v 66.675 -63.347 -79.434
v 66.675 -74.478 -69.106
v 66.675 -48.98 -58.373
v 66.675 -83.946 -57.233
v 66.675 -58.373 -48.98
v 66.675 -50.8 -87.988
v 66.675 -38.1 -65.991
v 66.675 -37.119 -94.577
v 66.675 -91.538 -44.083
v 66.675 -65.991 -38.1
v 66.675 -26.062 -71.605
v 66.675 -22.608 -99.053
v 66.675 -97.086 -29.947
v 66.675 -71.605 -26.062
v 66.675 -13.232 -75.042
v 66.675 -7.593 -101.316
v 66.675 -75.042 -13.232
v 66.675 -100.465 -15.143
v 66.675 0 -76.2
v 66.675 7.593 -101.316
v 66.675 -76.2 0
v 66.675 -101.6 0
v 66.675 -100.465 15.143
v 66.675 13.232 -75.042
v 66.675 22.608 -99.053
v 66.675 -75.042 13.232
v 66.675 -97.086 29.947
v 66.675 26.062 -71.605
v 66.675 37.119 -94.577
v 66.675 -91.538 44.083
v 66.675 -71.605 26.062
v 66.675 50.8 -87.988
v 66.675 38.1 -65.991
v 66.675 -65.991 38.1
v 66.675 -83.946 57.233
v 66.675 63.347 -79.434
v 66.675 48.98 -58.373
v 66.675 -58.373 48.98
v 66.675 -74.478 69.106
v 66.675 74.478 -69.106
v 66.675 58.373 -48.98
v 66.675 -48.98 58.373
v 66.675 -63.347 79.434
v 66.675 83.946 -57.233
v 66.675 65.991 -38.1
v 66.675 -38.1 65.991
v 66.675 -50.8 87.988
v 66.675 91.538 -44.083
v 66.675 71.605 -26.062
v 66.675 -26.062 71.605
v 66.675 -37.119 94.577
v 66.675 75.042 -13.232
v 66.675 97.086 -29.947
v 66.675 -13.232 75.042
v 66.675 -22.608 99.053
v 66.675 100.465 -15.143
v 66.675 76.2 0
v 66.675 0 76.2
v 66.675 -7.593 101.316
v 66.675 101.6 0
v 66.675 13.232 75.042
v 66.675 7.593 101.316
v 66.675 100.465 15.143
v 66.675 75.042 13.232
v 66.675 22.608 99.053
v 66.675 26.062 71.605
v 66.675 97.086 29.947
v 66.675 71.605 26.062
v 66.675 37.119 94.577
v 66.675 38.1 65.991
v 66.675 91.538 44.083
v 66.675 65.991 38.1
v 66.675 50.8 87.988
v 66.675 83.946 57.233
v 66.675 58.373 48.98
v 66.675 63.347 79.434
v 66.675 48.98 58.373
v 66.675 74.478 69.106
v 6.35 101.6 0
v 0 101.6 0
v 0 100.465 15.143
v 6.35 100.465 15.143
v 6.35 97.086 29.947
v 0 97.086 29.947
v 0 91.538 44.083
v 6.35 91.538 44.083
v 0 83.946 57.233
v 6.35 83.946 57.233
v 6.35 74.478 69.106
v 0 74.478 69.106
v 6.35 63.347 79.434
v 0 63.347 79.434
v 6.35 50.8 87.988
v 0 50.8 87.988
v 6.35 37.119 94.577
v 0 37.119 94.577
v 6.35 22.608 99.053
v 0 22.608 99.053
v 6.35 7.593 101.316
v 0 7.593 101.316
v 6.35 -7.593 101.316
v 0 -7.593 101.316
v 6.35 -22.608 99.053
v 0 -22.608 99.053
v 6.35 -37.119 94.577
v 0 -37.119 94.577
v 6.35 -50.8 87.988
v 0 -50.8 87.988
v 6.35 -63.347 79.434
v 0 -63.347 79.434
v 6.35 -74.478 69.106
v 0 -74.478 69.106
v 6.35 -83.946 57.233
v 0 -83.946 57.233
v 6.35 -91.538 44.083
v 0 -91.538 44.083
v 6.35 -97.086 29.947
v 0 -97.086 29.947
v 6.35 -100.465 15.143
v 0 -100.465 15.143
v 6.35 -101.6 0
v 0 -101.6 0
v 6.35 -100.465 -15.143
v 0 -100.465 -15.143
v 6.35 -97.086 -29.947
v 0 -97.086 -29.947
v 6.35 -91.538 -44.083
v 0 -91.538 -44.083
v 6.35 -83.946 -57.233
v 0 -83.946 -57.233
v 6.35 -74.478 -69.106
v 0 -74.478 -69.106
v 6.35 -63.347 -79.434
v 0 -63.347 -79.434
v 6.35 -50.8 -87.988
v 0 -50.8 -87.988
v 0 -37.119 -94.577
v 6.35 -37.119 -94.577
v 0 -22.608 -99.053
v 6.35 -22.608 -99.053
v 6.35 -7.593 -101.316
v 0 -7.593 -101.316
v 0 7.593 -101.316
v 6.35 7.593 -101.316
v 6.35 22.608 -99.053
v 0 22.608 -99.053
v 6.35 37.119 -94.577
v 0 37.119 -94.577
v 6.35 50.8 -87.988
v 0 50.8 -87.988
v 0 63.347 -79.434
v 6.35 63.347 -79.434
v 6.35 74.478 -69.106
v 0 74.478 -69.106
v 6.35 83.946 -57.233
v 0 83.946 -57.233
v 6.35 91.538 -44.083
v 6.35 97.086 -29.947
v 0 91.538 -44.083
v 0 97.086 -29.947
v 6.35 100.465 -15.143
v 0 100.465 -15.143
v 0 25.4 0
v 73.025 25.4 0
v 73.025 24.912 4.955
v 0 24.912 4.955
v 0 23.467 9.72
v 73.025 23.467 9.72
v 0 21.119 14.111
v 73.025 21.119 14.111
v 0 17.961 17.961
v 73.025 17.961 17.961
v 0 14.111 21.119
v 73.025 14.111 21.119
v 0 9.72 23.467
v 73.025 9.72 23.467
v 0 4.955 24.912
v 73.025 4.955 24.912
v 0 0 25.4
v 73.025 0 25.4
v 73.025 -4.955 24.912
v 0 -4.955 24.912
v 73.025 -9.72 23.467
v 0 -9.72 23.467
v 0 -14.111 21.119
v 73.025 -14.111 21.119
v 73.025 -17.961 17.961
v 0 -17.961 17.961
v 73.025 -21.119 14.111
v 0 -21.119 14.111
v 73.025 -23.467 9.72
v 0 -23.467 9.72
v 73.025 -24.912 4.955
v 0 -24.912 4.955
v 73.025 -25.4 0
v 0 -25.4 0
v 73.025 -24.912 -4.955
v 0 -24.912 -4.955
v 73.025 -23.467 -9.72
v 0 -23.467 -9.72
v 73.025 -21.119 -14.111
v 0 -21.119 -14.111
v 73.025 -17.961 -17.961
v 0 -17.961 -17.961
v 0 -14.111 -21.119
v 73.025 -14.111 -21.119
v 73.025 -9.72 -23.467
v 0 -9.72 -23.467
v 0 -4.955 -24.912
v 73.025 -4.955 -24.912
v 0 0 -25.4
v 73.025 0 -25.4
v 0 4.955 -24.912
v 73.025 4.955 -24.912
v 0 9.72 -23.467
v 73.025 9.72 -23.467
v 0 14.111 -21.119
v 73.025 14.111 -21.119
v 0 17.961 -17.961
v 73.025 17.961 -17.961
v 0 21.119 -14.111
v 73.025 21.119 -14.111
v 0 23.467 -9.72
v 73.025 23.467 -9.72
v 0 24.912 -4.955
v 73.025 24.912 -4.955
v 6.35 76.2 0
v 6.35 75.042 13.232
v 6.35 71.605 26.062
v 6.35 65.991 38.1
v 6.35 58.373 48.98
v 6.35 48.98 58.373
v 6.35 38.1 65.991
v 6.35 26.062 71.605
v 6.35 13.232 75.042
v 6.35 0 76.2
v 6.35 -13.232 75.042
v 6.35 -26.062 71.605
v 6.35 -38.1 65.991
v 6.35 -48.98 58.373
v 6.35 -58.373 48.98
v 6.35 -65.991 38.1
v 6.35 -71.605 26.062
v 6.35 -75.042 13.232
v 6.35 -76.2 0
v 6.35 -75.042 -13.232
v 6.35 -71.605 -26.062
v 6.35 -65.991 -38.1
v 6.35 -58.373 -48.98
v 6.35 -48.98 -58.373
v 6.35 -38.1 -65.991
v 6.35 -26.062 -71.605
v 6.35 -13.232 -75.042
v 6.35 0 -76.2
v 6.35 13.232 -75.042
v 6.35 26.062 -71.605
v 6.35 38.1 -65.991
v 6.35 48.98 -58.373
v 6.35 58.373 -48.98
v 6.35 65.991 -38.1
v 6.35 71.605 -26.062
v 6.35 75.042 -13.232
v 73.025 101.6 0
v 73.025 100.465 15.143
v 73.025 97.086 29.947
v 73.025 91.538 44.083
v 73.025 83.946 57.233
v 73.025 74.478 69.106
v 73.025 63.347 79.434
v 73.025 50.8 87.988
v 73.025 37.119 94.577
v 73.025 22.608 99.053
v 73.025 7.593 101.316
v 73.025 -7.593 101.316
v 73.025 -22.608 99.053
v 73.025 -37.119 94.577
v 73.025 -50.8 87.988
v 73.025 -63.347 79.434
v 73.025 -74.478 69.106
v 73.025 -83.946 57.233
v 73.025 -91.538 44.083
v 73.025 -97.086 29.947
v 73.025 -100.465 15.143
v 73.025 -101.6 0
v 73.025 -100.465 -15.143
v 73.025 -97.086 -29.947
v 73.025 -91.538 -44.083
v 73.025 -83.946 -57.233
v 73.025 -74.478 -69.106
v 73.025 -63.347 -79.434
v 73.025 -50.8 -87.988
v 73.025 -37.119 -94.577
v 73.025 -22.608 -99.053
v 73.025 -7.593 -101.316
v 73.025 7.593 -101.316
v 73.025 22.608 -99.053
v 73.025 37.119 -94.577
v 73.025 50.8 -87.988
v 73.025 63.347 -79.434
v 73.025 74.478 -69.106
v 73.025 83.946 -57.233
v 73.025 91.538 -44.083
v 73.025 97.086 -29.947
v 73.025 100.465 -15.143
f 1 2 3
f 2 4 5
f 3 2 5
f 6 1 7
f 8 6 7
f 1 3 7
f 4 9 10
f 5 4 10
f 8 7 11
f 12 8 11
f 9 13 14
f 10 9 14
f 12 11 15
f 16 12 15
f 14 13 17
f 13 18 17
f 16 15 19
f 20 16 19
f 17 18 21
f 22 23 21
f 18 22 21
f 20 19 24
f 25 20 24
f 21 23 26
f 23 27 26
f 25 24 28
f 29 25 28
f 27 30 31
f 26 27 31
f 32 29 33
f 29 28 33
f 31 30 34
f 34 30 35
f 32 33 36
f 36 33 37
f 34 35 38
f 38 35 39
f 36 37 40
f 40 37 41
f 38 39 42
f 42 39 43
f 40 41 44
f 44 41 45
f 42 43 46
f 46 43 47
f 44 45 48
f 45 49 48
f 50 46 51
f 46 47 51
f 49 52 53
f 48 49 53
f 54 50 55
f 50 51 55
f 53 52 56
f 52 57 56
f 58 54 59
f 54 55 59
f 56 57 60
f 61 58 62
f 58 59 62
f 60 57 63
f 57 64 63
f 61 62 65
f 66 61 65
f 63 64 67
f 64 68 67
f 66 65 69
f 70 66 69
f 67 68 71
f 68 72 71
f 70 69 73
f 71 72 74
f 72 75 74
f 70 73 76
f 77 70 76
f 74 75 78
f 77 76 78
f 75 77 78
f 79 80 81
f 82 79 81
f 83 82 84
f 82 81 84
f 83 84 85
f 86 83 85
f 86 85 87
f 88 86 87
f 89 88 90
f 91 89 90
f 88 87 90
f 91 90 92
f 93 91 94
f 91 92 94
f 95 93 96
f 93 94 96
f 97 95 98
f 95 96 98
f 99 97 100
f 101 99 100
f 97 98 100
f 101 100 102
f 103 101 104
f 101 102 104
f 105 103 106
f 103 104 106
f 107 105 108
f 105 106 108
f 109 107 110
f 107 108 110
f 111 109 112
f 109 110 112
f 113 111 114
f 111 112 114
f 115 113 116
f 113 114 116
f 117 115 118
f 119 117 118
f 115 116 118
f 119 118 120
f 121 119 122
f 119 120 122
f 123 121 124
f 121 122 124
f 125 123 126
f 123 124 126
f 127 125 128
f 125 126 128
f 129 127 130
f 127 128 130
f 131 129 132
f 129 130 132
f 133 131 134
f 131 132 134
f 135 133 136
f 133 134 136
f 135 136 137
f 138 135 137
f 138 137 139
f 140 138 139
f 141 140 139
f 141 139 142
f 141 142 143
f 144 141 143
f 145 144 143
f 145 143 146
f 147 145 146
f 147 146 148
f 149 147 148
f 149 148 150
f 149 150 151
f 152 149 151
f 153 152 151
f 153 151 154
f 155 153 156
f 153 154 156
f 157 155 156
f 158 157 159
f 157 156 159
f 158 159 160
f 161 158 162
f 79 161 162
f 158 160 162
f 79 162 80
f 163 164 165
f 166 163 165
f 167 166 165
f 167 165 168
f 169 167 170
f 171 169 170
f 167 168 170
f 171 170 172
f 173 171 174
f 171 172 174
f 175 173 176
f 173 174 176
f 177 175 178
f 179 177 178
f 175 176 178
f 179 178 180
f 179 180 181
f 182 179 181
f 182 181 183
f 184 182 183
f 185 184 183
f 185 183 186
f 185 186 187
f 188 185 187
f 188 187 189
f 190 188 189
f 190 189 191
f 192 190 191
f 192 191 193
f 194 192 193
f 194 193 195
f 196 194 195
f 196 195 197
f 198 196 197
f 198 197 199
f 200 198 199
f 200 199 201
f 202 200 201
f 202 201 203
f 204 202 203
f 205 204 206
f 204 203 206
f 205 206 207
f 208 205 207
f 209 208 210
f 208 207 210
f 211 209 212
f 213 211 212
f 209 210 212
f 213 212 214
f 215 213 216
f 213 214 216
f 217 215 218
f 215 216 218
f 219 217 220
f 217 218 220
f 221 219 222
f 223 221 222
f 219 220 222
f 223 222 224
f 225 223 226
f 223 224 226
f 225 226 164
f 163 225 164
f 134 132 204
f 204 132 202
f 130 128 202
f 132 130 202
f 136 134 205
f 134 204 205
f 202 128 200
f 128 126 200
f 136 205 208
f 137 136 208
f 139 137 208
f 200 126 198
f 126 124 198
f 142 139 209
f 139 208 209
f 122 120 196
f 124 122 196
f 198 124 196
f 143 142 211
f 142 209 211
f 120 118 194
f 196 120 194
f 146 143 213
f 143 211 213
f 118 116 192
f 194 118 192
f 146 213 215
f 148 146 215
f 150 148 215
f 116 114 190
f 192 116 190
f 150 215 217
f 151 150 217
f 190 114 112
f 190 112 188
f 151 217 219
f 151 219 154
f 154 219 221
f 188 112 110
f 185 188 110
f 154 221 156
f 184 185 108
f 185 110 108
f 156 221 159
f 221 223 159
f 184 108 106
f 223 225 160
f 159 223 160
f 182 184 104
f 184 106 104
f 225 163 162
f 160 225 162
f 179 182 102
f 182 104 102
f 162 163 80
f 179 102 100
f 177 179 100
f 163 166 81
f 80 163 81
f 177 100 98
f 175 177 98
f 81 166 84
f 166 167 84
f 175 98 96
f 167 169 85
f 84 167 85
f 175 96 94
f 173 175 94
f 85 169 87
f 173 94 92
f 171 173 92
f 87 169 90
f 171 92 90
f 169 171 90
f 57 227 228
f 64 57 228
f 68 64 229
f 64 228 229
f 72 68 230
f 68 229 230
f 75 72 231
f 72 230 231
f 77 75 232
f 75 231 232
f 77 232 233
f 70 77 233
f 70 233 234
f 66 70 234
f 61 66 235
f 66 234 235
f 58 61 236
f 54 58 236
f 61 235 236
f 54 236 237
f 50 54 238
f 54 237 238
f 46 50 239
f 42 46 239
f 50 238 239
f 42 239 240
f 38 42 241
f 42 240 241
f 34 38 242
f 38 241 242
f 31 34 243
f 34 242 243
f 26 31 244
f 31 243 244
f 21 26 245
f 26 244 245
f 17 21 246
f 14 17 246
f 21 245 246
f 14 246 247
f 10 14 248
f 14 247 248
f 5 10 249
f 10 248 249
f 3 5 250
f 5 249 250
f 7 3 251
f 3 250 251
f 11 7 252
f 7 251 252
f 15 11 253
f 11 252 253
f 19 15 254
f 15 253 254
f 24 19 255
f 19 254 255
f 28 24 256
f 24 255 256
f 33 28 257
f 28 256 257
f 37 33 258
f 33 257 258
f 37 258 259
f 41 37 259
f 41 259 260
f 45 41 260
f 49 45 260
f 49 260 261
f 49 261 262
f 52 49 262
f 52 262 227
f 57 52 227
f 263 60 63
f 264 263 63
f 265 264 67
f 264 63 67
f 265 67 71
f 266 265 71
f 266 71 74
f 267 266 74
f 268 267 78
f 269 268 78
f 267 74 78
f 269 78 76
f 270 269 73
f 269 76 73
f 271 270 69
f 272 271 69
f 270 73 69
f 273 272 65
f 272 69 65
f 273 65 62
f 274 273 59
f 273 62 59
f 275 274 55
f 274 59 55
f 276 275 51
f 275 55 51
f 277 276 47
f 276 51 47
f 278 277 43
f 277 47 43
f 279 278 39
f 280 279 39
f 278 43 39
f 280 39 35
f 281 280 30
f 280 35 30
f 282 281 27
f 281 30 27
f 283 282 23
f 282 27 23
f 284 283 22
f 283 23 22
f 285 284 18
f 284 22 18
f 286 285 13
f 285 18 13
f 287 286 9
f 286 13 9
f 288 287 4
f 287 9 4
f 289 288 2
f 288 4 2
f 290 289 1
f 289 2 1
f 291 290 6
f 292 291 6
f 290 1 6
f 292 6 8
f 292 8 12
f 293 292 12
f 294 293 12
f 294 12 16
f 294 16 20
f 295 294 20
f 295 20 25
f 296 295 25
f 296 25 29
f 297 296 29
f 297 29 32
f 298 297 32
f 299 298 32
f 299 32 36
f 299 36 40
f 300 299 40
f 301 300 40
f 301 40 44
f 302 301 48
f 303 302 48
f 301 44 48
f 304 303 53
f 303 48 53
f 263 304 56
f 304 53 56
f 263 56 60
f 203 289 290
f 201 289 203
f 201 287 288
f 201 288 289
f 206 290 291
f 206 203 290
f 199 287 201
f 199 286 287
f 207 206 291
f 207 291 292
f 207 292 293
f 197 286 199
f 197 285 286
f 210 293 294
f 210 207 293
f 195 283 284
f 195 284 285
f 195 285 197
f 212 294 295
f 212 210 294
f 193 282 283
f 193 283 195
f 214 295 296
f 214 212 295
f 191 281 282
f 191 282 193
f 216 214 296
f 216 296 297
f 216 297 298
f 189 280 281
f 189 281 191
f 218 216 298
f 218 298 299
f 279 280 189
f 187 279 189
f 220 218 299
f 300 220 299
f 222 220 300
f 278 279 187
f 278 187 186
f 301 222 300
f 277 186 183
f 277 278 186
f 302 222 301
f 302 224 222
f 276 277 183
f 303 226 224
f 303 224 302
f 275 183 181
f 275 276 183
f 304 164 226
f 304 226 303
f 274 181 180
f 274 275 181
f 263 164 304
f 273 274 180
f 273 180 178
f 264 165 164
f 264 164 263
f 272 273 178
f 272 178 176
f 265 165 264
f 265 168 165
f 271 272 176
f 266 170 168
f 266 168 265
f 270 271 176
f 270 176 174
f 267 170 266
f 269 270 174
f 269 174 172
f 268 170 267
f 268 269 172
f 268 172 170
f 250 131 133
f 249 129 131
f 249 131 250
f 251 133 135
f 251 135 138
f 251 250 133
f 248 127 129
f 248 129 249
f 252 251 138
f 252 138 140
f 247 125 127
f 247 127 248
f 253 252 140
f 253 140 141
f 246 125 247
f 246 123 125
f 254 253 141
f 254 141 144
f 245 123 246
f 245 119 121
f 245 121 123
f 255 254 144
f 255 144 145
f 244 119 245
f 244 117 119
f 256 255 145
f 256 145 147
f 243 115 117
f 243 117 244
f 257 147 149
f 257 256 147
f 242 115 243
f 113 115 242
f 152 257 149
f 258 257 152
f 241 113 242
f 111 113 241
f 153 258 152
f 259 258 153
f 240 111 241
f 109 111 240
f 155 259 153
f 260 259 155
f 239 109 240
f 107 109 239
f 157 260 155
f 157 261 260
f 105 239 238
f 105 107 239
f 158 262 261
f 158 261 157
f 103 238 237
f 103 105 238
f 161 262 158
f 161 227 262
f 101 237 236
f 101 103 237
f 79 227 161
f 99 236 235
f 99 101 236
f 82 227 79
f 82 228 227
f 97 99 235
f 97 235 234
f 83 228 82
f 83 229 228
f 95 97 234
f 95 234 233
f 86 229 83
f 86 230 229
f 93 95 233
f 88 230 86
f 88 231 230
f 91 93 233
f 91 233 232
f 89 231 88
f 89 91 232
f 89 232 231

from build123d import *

# Parameters (mm, degrees)
F0_R     = 101.6
F1_DEPTH = 6.35
F2_R     = 76.2
F3_DEPTH = 60.325
F4_R     = 101.6
F5_DEPTH = 6.35
F6_R     = 25.4
F7_DEPTH = 73.026


with BuildPart() as f1:
    # F0 (on Right) → F1 (new body)
    with BuildSketch(Plane.YZ):
        Circle(F0_R)
    extrude(amount=F1_DEPTH)

    # F2 (on face) → F3 (join)
    with BuildSketch(Plane.YZ.offset(6.35)):
        Circle(F2_R)
    extrude(amount=F3_DEPTH)

    # F4 (on face) → F5 (join)
    with BuildSketch(Plane.YZ.offset(66.675)):
        Circle(F4_R)
    extrude(amount=F5_DEPTH)

    # F6 (on face) → F7 (cut, through all)
    with BuildSketch(Plane.YZ.offset(73.025)):
        Circle(F6_R)
    extrude(amount=-F7_DEPTH, mode=Mode.SUBTRACT)


solid = f1.part
